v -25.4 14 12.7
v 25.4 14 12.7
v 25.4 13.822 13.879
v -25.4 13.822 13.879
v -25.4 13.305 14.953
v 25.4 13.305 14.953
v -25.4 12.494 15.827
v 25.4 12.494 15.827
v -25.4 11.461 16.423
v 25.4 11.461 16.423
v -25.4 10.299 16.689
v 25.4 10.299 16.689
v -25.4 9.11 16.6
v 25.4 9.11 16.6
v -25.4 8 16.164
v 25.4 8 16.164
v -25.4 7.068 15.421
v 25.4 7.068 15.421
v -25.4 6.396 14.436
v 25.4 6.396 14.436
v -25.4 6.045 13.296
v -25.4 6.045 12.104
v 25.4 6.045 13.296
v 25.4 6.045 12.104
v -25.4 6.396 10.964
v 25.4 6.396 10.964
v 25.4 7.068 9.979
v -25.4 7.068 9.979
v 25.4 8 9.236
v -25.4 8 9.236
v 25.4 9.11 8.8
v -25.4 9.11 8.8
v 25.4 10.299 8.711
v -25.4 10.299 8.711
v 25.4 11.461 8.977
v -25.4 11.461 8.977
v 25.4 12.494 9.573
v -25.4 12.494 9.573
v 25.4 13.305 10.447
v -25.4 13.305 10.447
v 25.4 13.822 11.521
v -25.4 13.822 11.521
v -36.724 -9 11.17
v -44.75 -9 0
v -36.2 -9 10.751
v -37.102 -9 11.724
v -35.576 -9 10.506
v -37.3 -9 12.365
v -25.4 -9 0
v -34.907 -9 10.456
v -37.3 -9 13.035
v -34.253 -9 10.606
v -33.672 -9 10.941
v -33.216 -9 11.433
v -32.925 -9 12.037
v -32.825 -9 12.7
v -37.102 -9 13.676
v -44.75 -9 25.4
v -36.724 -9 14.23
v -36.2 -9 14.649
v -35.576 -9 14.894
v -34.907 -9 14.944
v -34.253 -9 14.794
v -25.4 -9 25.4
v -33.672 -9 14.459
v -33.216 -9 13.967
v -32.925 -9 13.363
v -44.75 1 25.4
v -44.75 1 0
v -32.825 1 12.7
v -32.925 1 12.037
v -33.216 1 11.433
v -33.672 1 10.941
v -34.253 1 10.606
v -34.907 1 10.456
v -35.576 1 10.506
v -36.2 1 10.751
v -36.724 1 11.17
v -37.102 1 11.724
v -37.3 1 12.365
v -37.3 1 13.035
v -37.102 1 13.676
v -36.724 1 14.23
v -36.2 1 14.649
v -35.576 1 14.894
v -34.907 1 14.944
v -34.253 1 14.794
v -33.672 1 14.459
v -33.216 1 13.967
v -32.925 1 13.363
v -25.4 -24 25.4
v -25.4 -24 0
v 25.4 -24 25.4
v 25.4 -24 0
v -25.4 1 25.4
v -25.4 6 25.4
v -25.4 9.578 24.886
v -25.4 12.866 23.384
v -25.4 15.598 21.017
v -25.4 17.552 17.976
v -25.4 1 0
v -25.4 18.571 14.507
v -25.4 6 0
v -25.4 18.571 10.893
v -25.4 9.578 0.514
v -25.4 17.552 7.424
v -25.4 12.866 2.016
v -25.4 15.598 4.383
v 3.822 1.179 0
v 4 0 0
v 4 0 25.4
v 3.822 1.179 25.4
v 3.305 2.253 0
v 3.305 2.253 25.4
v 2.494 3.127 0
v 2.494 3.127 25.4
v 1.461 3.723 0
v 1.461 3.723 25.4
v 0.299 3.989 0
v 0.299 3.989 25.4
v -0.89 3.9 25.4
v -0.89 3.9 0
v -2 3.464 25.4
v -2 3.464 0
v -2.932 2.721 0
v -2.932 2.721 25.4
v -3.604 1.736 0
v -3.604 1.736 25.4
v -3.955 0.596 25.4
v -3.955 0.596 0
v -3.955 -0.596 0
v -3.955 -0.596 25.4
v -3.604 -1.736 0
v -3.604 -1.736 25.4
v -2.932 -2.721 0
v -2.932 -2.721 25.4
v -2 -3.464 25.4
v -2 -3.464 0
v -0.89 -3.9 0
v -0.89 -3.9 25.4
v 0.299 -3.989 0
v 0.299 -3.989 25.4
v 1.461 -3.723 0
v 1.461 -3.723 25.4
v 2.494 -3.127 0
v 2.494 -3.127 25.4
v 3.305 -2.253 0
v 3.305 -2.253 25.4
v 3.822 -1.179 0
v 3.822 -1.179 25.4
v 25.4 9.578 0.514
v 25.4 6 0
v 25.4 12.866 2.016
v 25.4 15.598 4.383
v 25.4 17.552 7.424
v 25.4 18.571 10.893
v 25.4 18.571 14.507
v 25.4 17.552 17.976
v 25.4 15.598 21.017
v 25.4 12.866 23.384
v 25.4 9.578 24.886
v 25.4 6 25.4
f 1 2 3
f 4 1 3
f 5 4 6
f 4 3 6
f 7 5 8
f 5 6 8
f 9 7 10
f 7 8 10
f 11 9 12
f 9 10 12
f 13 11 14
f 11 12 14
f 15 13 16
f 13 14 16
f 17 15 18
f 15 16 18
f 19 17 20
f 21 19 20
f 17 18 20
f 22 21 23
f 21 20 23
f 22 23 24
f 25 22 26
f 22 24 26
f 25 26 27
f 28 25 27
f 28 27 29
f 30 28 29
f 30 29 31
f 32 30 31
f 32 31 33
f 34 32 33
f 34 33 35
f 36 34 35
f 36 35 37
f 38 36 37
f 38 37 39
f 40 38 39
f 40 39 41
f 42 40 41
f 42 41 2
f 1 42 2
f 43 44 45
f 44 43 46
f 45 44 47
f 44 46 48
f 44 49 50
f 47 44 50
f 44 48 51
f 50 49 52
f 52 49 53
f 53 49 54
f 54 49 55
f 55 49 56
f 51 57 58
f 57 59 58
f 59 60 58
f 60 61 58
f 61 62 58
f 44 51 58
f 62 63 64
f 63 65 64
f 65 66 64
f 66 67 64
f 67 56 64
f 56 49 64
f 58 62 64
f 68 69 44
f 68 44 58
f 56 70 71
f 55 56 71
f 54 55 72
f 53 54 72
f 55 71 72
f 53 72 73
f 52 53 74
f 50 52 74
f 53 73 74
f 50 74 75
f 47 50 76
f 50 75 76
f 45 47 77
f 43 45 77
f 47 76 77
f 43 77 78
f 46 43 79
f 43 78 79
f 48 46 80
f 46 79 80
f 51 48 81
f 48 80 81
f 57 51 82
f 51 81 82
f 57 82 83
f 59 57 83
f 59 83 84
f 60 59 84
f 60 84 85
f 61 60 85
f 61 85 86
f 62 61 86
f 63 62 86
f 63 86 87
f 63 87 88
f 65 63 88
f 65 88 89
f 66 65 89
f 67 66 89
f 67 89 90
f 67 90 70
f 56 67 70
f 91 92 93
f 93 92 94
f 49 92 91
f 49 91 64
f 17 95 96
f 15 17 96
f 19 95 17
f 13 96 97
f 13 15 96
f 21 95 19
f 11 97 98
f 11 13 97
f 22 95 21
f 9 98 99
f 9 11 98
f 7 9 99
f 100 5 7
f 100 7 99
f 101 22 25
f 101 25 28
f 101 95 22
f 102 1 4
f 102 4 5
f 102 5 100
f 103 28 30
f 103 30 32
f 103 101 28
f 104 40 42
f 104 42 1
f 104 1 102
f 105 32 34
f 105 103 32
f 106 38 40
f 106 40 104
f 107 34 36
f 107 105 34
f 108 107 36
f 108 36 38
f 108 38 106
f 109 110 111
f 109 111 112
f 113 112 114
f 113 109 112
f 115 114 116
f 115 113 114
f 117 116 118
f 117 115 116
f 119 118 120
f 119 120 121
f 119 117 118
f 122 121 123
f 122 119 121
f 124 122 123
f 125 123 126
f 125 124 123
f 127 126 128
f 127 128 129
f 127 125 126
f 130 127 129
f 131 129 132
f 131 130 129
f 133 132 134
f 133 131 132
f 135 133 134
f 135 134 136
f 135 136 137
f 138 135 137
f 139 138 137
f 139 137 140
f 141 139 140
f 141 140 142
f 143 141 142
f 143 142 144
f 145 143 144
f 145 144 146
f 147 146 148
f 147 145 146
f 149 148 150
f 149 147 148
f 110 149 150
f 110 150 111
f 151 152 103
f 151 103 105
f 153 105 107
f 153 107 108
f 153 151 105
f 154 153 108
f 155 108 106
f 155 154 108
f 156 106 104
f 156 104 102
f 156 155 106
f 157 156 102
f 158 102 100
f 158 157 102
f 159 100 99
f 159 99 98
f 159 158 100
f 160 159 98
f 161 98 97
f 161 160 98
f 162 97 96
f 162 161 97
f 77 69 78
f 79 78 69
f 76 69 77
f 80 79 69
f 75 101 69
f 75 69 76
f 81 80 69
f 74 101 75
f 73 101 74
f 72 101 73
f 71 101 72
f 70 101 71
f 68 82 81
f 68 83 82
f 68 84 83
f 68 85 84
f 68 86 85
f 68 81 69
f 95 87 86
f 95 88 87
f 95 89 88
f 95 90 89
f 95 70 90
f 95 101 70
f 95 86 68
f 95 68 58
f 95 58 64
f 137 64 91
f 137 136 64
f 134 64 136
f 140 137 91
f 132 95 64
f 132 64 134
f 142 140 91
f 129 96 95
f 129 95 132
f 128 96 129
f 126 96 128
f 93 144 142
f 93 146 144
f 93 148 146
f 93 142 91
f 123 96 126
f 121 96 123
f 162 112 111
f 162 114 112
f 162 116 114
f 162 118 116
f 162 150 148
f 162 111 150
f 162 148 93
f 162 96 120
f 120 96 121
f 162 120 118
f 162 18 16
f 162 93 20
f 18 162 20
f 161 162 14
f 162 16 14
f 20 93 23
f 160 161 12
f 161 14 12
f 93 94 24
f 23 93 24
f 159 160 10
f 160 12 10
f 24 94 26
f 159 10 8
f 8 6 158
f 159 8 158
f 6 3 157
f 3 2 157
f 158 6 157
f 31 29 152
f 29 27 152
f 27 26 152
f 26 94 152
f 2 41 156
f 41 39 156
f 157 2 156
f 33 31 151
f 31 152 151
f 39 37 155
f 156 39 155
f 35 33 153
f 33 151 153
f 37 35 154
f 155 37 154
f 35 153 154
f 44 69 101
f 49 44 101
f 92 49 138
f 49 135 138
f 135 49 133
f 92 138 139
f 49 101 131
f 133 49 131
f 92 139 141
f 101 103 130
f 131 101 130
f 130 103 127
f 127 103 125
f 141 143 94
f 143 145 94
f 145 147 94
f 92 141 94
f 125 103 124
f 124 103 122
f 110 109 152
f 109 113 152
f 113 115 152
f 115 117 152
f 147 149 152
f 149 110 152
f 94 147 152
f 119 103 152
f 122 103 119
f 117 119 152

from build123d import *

# Parameters (mm, degrees)
SKETCH1_W            = 50.8
SKETCH1_H            = 30
SKETCH1_R            = 4
BOSS_EXTRUDE1_DEPTH  = 25.4
SKETCH2_R            = 4
BOSS_EXTRUDE3_DEPTH  = 50.8
SKETCH4_W            = 25.4
SKETCH4_H            = 10
BOSS_EXTRUDE4_DEPTH  = 19.3499994
M4_CLEARANCE_HOLE1_D = 4.5


with BuildPart() as part:
    # Sketch1 → Boss-Extrude1 (new body)
    with BuildSketch(Plane.XY):
        with Locations((0, -9)):
            Rectangle(SKETCH1_W, SKETCH1_H)
        Circle(SKETCH1_R, mode=Mode.SUBTRACT)
    extrude(amount=BOSS_EXTRUDE1_DEPTH)

    # Sketch2 → Boss-Extrude3 (add, through all)
    with BuildSketch(Plane(origin=(25.4, 0, 0), x_dir=(0, 0, -1), z_dir=(1, 0, 0))):
        with BuildLine():
            Line((-25.4, 6), (-25.4, 5))
            Line((-25.4, 5), (0, 5))
            Line((0, 5), (0, 6))
            ThreePointArc((0, 6), (-12.7, 18.7), (-25.4, 6))
        make_face()
        with Locations(Location((-12.7, 10, 0), (0, 0, 90))):
            Circle(SKETCH2_R, mode=Mode.SUBTRACT)
    extrude(amount=-BOSS_EXTRUDE3_DEPTH)

    # Sketch4 → Boss-Extrude4 (add)
    with BuildSketch(Plane.ZY.offset(25.4)):
        with Locations((12.7, -4)):
            Rectangle(SKETCH4_W, SKETCH4_H)
    extrude(amount=BOSS_EXTRUDE4_DEPTH)

    # M4 Clearance Hole1 (through all)
    with Locations(Plane(origin=(0, -9, 0), x_dir=(-1, 0, 0), z_dir=(0, -1, 0))):
        with Locations((35.0749997, -12.7)):
            Hole(M4_CLEARANCE_HOLE1_D / 2)


solid = part.part
